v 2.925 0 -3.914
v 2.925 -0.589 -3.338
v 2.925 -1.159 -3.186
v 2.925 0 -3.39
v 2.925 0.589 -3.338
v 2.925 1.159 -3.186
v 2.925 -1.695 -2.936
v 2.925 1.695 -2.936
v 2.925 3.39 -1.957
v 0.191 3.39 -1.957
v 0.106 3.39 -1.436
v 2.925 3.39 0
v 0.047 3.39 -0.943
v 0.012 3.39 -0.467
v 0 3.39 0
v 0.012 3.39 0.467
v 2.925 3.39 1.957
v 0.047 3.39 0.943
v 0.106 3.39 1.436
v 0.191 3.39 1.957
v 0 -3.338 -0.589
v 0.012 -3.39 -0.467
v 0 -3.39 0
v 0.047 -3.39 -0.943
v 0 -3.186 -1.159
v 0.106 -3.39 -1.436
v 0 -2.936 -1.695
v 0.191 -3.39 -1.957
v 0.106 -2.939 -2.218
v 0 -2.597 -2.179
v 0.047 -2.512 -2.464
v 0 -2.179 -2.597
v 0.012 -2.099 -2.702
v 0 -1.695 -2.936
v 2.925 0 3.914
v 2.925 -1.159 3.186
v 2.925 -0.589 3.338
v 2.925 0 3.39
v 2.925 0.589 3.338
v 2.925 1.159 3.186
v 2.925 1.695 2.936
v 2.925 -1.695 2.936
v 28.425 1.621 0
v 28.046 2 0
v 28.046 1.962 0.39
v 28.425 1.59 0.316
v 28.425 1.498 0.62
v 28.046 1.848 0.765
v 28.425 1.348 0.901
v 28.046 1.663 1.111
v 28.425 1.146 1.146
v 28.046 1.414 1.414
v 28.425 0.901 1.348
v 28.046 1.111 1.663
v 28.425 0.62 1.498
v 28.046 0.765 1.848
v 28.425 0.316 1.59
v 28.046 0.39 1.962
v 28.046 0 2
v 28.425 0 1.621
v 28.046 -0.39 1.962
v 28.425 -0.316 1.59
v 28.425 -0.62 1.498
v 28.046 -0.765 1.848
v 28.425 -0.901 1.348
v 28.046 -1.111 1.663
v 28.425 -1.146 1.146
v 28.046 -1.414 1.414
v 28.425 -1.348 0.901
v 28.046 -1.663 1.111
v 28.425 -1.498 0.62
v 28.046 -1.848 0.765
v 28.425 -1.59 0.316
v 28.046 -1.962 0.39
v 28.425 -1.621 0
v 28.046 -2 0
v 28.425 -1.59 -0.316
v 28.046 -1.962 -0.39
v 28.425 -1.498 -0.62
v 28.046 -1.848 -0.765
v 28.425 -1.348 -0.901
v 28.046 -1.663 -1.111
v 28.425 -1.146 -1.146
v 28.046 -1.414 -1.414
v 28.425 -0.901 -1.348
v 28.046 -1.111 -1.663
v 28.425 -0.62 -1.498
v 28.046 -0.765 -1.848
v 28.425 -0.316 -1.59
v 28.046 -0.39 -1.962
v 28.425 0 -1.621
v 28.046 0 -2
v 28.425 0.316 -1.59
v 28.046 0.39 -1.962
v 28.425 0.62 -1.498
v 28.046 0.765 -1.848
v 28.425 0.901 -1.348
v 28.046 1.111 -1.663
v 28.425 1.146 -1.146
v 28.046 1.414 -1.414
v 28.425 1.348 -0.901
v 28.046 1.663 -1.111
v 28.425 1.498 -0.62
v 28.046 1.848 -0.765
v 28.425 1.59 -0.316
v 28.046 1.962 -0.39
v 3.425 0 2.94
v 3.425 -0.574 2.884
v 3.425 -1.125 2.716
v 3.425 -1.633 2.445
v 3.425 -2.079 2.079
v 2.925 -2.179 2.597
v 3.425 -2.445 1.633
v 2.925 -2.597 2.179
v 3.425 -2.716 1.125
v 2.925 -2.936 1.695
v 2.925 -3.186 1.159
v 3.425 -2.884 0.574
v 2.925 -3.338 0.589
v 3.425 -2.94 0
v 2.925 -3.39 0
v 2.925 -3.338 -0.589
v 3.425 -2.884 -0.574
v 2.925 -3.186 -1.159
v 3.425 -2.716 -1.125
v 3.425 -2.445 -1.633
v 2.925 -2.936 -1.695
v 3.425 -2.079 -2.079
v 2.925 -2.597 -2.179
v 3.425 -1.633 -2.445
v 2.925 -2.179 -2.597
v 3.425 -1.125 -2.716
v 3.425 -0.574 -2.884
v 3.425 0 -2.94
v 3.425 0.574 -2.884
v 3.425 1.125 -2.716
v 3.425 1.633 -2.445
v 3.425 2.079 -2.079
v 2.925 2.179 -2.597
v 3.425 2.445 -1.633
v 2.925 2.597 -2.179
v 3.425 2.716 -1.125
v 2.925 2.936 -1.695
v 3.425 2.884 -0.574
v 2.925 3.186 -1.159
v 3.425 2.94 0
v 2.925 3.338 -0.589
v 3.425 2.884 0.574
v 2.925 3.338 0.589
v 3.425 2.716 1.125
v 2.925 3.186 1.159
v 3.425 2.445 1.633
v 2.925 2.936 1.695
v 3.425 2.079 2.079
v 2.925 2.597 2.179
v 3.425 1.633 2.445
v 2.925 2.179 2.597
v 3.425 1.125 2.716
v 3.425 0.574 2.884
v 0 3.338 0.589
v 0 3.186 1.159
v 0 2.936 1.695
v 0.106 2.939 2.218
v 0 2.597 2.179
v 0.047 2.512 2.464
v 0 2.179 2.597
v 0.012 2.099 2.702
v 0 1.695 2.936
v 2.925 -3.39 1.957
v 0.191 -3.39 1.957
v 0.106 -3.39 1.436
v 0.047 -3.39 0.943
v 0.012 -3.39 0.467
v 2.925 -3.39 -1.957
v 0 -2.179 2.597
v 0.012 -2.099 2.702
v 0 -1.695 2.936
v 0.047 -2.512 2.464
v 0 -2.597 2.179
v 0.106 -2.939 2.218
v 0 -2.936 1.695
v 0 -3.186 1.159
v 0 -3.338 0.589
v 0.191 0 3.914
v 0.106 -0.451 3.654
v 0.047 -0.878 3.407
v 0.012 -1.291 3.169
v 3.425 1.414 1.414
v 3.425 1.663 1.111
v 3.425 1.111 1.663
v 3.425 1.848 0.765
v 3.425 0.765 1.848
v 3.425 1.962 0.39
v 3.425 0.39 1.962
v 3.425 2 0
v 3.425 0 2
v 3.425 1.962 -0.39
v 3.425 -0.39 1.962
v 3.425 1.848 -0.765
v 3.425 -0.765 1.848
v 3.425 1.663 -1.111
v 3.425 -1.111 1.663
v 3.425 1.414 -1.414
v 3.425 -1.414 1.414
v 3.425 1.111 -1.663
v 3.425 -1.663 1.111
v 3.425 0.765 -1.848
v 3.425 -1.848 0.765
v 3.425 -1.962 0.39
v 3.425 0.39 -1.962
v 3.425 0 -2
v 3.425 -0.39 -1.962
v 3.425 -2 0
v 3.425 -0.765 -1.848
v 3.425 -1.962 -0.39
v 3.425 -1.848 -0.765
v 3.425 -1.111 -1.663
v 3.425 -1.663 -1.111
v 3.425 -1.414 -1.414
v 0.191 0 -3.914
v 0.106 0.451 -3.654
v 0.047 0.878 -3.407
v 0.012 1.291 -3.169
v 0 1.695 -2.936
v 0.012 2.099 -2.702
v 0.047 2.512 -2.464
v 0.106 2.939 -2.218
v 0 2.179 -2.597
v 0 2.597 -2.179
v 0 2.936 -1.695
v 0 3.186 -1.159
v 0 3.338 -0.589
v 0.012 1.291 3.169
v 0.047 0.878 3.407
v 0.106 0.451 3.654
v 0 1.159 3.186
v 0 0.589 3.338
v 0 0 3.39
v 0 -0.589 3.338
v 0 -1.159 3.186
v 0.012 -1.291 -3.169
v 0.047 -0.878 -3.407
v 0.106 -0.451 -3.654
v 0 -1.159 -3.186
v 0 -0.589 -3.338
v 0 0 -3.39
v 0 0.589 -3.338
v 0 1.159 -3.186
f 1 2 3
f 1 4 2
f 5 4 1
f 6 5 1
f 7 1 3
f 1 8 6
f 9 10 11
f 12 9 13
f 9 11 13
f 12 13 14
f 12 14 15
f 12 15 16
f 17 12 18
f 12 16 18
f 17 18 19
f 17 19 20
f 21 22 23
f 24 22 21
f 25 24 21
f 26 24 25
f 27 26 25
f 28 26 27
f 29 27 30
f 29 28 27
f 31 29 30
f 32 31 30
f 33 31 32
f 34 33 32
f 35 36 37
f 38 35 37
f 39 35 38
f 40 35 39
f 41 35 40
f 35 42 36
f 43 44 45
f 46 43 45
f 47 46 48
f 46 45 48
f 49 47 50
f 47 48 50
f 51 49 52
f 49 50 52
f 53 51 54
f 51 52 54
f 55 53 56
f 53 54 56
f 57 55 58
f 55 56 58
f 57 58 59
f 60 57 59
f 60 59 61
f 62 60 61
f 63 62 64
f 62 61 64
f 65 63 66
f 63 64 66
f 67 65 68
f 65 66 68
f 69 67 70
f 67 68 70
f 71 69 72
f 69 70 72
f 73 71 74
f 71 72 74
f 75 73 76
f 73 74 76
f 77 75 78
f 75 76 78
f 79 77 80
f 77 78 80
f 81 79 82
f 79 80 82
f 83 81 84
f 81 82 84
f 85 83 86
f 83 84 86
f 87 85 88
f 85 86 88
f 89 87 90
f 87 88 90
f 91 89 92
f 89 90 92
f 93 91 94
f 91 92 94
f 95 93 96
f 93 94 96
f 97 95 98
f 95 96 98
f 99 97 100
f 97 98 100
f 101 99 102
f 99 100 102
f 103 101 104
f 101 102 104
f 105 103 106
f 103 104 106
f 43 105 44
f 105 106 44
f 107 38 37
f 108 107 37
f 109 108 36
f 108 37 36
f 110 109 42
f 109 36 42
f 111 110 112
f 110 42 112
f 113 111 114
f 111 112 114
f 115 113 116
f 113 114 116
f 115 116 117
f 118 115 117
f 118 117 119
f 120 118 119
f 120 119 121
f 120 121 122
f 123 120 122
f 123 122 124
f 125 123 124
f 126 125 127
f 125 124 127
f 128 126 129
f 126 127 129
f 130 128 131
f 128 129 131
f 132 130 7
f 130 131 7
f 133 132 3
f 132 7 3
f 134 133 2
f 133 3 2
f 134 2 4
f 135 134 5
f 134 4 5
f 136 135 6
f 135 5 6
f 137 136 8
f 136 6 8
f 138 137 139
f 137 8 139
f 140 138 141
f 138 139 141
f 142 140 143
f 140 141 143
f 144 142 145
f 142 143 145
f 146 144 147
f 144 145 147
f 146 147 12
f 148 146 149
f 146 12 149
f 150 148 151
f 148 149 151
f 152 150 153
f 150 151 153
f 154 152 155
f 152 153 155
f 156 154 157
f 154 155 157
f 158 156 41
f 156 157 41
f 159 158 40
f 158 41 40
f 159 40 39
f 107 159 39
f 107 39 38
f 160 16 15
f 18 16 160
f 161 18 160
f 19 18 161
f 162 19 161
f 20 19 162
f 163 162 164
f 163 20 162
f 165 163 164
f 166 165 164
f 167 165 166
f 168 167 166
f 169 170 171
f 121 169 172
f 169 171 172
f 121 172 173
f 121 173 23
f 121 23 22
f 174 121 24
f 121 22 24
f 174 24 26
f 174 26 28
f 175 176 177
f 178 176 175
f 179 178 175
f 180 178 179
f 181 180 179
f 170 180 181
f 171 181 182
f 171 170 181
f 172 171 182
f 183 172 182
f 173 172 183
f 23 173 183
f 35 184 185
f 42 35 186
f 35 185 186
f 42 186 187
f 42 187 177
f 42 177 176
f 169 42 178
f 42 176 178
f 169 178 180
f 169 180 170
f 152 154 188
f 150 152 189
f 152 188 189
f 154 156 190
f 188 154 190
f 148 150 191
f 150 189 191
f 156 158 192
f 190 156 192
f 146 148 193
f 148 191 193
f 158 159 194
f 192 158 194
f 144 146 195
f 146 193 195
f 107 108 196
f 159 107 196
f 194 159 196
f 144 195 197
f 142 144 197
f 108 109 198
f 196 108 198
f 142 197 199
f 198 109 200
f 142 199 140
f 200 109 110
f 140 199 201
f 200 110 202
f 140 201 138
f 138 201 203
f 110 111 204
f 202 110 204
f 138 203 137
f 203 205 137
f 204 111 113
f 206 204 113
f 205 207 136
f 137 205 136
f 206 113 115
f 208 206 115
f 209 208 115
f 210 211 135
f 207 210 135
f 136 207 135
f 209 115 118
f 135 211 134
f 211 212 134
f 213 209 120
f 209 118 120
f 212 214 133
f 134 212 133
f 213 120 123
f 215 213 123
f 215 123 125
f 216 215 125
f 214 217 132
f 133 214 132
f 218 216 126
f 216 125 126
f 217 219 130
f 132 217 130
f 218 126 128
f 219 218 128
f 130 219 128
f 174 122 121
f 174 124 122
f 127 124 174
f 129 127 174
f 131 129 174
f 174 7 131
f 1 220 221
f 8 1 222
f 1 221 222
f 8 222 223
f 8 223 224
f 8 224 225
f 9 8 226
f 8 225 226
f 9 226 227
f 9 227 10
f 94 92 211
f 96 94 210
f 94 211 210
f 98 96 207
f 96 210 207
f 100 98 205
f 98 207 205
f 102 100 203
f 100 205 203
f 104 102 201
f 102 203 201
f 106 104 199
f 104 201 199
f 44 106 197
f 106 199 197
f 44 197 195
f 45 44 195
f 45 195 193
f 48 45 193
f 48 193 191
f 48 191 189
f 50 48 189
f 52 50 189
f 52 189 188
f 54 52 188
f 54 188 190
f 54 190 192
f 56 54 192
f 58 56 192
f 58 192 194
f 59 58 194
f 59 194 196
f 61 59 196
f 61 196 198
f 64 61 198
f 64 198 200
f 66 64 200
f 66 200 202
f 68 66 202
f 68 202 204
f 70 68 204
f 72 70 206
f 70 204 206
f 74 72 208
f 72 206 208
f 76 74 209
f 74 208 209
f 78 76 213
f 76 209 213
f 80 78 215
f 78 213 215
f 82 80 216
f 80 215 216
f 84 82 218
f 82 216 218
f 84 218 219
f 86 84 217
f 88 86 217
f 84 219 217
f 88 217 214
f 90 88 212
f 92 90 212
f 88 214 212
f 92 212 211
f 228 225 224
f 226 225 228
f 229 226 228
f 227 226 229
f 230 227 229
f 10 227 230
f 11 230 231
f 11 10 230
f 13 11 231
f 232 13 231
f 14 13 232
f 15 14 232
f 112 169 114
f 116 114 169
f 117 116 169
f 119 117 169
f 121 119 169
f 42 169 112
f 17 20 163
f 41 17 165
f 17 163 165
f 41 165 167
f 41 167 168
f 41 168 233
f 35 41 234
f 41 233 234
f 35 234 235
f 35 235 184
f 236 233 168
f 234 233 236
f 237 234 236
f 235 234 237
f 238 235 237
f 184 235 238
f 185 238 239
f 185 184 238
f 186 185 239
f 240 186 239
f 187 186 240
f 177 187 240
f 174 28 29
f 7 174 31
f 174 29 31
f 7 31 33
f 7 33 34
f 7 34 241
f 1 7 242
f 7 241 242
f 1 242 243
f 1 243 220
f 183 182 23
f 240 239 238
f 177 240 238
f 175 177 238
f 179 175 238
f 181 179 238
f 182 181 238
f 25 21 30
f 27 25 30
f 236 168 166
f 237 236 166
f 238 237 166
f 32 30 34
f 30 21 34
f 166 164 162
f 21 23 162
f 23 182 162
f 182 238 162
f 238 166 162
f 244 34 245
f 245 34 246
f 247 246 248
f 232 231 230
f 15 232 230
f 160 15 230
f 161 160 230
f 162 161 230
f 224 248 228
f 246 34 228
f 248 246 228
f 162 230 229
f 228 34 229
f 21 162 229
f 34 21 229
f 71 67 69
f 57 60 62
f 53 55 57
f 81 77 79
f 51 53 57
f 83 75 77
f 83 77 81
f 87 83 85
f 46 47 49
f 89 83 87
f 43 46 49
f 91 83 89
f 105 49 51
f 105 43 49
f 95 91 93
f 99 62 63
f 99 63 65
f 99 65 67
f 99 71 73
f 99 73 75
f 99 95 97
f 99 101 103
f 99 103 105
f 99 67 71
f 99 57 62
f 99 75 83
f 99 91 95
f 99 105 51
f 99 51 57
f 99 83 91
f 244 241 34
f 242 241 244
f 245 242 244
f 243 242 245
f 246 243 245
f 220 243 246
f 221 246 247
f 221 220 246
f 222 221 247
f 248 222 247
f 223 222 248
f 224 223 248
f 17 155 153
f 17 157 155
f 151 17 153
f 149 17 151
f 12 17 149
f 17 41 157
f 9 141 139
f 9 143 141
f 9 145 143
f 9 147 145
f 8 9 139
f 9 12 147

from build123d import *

# Parameters (mm, degrees)
BASEHEAD_DEPTH = 2.925
SKETCH3_R      = 2
BASEBODY_DEPTH = 25


with BuildPart() as part:
    # Sketch-BaseHead → BaseHead (new body)
    with BuildSketch(Plane(origin=(0, 0, 0), x_dir=(0, 0, -1), z_dir=(1, 0, 0))):
        Polygon((3.914434825, 0), (1.957217413, 3.39), (-1.957217413, 3.39), (-3.914434825, 0), (-1.957217413, -3.39), (1.957217413, -3.39), align=None)
    extrude(amount=BASEHEAD_DEPTH)

    # Sketch4 → HeadChamfer (revolve, cut)
    with BuildSketch(Plane(origin=(-0.264637255, 0, 5.916896391), x_dir=(0, 0, -1), z_dir=(0, 1, 0))):
        Polygon((9.831331216, -0.264637255), (9.306896391, -0.264637255), (9.831331216, -0.455515922), align=None)
    revolve(axis=Axis((-4.001564945, 0, 0), (1, 0, 0)), mode=Mode.SUBTRACT)

    # Sketch1 → Revolve1 (revolve)
    with BuildSketch(Plane.XY, mode=Mode.PRIVATE) as revolve1_sk:
        Polygon((2.925, 0), (3.425, 0), (3.425, -2.94), (2.925, -3.39), align=None)
    revolve(revolve1_sk.sketch.rotate(Axis((-4.001564945, 0, 0), (1, 0, 0)), 270), axis=Axis((-4.001564945, 0, 0), (1, 0, 0)))

    # Sketch3 → BaseBody (add)
    with BuildSketch(Plane(origin=(3.425, 0, 0), x_dir=(0, 0, -1), z_dir=(1, 0, 0))):
        Circle(SKETCH3_R)
    extrude(amount=BASEBODY_DEPTH)

    # Chamfer1: read off the stored shape, not the designer's step
    # Chamfer1 outline → Chamfer1 (revolve, cut)
    with BuildSketch(Plane.YX):
        Polygon((2, 28.425), (1.621, 28.425), (2, 28.046), align=None)
    revolve(axis=Axis((0, 0, 0), (1, 0, 0)), mode=Mode.SUBTRACT)


solid = part.part
